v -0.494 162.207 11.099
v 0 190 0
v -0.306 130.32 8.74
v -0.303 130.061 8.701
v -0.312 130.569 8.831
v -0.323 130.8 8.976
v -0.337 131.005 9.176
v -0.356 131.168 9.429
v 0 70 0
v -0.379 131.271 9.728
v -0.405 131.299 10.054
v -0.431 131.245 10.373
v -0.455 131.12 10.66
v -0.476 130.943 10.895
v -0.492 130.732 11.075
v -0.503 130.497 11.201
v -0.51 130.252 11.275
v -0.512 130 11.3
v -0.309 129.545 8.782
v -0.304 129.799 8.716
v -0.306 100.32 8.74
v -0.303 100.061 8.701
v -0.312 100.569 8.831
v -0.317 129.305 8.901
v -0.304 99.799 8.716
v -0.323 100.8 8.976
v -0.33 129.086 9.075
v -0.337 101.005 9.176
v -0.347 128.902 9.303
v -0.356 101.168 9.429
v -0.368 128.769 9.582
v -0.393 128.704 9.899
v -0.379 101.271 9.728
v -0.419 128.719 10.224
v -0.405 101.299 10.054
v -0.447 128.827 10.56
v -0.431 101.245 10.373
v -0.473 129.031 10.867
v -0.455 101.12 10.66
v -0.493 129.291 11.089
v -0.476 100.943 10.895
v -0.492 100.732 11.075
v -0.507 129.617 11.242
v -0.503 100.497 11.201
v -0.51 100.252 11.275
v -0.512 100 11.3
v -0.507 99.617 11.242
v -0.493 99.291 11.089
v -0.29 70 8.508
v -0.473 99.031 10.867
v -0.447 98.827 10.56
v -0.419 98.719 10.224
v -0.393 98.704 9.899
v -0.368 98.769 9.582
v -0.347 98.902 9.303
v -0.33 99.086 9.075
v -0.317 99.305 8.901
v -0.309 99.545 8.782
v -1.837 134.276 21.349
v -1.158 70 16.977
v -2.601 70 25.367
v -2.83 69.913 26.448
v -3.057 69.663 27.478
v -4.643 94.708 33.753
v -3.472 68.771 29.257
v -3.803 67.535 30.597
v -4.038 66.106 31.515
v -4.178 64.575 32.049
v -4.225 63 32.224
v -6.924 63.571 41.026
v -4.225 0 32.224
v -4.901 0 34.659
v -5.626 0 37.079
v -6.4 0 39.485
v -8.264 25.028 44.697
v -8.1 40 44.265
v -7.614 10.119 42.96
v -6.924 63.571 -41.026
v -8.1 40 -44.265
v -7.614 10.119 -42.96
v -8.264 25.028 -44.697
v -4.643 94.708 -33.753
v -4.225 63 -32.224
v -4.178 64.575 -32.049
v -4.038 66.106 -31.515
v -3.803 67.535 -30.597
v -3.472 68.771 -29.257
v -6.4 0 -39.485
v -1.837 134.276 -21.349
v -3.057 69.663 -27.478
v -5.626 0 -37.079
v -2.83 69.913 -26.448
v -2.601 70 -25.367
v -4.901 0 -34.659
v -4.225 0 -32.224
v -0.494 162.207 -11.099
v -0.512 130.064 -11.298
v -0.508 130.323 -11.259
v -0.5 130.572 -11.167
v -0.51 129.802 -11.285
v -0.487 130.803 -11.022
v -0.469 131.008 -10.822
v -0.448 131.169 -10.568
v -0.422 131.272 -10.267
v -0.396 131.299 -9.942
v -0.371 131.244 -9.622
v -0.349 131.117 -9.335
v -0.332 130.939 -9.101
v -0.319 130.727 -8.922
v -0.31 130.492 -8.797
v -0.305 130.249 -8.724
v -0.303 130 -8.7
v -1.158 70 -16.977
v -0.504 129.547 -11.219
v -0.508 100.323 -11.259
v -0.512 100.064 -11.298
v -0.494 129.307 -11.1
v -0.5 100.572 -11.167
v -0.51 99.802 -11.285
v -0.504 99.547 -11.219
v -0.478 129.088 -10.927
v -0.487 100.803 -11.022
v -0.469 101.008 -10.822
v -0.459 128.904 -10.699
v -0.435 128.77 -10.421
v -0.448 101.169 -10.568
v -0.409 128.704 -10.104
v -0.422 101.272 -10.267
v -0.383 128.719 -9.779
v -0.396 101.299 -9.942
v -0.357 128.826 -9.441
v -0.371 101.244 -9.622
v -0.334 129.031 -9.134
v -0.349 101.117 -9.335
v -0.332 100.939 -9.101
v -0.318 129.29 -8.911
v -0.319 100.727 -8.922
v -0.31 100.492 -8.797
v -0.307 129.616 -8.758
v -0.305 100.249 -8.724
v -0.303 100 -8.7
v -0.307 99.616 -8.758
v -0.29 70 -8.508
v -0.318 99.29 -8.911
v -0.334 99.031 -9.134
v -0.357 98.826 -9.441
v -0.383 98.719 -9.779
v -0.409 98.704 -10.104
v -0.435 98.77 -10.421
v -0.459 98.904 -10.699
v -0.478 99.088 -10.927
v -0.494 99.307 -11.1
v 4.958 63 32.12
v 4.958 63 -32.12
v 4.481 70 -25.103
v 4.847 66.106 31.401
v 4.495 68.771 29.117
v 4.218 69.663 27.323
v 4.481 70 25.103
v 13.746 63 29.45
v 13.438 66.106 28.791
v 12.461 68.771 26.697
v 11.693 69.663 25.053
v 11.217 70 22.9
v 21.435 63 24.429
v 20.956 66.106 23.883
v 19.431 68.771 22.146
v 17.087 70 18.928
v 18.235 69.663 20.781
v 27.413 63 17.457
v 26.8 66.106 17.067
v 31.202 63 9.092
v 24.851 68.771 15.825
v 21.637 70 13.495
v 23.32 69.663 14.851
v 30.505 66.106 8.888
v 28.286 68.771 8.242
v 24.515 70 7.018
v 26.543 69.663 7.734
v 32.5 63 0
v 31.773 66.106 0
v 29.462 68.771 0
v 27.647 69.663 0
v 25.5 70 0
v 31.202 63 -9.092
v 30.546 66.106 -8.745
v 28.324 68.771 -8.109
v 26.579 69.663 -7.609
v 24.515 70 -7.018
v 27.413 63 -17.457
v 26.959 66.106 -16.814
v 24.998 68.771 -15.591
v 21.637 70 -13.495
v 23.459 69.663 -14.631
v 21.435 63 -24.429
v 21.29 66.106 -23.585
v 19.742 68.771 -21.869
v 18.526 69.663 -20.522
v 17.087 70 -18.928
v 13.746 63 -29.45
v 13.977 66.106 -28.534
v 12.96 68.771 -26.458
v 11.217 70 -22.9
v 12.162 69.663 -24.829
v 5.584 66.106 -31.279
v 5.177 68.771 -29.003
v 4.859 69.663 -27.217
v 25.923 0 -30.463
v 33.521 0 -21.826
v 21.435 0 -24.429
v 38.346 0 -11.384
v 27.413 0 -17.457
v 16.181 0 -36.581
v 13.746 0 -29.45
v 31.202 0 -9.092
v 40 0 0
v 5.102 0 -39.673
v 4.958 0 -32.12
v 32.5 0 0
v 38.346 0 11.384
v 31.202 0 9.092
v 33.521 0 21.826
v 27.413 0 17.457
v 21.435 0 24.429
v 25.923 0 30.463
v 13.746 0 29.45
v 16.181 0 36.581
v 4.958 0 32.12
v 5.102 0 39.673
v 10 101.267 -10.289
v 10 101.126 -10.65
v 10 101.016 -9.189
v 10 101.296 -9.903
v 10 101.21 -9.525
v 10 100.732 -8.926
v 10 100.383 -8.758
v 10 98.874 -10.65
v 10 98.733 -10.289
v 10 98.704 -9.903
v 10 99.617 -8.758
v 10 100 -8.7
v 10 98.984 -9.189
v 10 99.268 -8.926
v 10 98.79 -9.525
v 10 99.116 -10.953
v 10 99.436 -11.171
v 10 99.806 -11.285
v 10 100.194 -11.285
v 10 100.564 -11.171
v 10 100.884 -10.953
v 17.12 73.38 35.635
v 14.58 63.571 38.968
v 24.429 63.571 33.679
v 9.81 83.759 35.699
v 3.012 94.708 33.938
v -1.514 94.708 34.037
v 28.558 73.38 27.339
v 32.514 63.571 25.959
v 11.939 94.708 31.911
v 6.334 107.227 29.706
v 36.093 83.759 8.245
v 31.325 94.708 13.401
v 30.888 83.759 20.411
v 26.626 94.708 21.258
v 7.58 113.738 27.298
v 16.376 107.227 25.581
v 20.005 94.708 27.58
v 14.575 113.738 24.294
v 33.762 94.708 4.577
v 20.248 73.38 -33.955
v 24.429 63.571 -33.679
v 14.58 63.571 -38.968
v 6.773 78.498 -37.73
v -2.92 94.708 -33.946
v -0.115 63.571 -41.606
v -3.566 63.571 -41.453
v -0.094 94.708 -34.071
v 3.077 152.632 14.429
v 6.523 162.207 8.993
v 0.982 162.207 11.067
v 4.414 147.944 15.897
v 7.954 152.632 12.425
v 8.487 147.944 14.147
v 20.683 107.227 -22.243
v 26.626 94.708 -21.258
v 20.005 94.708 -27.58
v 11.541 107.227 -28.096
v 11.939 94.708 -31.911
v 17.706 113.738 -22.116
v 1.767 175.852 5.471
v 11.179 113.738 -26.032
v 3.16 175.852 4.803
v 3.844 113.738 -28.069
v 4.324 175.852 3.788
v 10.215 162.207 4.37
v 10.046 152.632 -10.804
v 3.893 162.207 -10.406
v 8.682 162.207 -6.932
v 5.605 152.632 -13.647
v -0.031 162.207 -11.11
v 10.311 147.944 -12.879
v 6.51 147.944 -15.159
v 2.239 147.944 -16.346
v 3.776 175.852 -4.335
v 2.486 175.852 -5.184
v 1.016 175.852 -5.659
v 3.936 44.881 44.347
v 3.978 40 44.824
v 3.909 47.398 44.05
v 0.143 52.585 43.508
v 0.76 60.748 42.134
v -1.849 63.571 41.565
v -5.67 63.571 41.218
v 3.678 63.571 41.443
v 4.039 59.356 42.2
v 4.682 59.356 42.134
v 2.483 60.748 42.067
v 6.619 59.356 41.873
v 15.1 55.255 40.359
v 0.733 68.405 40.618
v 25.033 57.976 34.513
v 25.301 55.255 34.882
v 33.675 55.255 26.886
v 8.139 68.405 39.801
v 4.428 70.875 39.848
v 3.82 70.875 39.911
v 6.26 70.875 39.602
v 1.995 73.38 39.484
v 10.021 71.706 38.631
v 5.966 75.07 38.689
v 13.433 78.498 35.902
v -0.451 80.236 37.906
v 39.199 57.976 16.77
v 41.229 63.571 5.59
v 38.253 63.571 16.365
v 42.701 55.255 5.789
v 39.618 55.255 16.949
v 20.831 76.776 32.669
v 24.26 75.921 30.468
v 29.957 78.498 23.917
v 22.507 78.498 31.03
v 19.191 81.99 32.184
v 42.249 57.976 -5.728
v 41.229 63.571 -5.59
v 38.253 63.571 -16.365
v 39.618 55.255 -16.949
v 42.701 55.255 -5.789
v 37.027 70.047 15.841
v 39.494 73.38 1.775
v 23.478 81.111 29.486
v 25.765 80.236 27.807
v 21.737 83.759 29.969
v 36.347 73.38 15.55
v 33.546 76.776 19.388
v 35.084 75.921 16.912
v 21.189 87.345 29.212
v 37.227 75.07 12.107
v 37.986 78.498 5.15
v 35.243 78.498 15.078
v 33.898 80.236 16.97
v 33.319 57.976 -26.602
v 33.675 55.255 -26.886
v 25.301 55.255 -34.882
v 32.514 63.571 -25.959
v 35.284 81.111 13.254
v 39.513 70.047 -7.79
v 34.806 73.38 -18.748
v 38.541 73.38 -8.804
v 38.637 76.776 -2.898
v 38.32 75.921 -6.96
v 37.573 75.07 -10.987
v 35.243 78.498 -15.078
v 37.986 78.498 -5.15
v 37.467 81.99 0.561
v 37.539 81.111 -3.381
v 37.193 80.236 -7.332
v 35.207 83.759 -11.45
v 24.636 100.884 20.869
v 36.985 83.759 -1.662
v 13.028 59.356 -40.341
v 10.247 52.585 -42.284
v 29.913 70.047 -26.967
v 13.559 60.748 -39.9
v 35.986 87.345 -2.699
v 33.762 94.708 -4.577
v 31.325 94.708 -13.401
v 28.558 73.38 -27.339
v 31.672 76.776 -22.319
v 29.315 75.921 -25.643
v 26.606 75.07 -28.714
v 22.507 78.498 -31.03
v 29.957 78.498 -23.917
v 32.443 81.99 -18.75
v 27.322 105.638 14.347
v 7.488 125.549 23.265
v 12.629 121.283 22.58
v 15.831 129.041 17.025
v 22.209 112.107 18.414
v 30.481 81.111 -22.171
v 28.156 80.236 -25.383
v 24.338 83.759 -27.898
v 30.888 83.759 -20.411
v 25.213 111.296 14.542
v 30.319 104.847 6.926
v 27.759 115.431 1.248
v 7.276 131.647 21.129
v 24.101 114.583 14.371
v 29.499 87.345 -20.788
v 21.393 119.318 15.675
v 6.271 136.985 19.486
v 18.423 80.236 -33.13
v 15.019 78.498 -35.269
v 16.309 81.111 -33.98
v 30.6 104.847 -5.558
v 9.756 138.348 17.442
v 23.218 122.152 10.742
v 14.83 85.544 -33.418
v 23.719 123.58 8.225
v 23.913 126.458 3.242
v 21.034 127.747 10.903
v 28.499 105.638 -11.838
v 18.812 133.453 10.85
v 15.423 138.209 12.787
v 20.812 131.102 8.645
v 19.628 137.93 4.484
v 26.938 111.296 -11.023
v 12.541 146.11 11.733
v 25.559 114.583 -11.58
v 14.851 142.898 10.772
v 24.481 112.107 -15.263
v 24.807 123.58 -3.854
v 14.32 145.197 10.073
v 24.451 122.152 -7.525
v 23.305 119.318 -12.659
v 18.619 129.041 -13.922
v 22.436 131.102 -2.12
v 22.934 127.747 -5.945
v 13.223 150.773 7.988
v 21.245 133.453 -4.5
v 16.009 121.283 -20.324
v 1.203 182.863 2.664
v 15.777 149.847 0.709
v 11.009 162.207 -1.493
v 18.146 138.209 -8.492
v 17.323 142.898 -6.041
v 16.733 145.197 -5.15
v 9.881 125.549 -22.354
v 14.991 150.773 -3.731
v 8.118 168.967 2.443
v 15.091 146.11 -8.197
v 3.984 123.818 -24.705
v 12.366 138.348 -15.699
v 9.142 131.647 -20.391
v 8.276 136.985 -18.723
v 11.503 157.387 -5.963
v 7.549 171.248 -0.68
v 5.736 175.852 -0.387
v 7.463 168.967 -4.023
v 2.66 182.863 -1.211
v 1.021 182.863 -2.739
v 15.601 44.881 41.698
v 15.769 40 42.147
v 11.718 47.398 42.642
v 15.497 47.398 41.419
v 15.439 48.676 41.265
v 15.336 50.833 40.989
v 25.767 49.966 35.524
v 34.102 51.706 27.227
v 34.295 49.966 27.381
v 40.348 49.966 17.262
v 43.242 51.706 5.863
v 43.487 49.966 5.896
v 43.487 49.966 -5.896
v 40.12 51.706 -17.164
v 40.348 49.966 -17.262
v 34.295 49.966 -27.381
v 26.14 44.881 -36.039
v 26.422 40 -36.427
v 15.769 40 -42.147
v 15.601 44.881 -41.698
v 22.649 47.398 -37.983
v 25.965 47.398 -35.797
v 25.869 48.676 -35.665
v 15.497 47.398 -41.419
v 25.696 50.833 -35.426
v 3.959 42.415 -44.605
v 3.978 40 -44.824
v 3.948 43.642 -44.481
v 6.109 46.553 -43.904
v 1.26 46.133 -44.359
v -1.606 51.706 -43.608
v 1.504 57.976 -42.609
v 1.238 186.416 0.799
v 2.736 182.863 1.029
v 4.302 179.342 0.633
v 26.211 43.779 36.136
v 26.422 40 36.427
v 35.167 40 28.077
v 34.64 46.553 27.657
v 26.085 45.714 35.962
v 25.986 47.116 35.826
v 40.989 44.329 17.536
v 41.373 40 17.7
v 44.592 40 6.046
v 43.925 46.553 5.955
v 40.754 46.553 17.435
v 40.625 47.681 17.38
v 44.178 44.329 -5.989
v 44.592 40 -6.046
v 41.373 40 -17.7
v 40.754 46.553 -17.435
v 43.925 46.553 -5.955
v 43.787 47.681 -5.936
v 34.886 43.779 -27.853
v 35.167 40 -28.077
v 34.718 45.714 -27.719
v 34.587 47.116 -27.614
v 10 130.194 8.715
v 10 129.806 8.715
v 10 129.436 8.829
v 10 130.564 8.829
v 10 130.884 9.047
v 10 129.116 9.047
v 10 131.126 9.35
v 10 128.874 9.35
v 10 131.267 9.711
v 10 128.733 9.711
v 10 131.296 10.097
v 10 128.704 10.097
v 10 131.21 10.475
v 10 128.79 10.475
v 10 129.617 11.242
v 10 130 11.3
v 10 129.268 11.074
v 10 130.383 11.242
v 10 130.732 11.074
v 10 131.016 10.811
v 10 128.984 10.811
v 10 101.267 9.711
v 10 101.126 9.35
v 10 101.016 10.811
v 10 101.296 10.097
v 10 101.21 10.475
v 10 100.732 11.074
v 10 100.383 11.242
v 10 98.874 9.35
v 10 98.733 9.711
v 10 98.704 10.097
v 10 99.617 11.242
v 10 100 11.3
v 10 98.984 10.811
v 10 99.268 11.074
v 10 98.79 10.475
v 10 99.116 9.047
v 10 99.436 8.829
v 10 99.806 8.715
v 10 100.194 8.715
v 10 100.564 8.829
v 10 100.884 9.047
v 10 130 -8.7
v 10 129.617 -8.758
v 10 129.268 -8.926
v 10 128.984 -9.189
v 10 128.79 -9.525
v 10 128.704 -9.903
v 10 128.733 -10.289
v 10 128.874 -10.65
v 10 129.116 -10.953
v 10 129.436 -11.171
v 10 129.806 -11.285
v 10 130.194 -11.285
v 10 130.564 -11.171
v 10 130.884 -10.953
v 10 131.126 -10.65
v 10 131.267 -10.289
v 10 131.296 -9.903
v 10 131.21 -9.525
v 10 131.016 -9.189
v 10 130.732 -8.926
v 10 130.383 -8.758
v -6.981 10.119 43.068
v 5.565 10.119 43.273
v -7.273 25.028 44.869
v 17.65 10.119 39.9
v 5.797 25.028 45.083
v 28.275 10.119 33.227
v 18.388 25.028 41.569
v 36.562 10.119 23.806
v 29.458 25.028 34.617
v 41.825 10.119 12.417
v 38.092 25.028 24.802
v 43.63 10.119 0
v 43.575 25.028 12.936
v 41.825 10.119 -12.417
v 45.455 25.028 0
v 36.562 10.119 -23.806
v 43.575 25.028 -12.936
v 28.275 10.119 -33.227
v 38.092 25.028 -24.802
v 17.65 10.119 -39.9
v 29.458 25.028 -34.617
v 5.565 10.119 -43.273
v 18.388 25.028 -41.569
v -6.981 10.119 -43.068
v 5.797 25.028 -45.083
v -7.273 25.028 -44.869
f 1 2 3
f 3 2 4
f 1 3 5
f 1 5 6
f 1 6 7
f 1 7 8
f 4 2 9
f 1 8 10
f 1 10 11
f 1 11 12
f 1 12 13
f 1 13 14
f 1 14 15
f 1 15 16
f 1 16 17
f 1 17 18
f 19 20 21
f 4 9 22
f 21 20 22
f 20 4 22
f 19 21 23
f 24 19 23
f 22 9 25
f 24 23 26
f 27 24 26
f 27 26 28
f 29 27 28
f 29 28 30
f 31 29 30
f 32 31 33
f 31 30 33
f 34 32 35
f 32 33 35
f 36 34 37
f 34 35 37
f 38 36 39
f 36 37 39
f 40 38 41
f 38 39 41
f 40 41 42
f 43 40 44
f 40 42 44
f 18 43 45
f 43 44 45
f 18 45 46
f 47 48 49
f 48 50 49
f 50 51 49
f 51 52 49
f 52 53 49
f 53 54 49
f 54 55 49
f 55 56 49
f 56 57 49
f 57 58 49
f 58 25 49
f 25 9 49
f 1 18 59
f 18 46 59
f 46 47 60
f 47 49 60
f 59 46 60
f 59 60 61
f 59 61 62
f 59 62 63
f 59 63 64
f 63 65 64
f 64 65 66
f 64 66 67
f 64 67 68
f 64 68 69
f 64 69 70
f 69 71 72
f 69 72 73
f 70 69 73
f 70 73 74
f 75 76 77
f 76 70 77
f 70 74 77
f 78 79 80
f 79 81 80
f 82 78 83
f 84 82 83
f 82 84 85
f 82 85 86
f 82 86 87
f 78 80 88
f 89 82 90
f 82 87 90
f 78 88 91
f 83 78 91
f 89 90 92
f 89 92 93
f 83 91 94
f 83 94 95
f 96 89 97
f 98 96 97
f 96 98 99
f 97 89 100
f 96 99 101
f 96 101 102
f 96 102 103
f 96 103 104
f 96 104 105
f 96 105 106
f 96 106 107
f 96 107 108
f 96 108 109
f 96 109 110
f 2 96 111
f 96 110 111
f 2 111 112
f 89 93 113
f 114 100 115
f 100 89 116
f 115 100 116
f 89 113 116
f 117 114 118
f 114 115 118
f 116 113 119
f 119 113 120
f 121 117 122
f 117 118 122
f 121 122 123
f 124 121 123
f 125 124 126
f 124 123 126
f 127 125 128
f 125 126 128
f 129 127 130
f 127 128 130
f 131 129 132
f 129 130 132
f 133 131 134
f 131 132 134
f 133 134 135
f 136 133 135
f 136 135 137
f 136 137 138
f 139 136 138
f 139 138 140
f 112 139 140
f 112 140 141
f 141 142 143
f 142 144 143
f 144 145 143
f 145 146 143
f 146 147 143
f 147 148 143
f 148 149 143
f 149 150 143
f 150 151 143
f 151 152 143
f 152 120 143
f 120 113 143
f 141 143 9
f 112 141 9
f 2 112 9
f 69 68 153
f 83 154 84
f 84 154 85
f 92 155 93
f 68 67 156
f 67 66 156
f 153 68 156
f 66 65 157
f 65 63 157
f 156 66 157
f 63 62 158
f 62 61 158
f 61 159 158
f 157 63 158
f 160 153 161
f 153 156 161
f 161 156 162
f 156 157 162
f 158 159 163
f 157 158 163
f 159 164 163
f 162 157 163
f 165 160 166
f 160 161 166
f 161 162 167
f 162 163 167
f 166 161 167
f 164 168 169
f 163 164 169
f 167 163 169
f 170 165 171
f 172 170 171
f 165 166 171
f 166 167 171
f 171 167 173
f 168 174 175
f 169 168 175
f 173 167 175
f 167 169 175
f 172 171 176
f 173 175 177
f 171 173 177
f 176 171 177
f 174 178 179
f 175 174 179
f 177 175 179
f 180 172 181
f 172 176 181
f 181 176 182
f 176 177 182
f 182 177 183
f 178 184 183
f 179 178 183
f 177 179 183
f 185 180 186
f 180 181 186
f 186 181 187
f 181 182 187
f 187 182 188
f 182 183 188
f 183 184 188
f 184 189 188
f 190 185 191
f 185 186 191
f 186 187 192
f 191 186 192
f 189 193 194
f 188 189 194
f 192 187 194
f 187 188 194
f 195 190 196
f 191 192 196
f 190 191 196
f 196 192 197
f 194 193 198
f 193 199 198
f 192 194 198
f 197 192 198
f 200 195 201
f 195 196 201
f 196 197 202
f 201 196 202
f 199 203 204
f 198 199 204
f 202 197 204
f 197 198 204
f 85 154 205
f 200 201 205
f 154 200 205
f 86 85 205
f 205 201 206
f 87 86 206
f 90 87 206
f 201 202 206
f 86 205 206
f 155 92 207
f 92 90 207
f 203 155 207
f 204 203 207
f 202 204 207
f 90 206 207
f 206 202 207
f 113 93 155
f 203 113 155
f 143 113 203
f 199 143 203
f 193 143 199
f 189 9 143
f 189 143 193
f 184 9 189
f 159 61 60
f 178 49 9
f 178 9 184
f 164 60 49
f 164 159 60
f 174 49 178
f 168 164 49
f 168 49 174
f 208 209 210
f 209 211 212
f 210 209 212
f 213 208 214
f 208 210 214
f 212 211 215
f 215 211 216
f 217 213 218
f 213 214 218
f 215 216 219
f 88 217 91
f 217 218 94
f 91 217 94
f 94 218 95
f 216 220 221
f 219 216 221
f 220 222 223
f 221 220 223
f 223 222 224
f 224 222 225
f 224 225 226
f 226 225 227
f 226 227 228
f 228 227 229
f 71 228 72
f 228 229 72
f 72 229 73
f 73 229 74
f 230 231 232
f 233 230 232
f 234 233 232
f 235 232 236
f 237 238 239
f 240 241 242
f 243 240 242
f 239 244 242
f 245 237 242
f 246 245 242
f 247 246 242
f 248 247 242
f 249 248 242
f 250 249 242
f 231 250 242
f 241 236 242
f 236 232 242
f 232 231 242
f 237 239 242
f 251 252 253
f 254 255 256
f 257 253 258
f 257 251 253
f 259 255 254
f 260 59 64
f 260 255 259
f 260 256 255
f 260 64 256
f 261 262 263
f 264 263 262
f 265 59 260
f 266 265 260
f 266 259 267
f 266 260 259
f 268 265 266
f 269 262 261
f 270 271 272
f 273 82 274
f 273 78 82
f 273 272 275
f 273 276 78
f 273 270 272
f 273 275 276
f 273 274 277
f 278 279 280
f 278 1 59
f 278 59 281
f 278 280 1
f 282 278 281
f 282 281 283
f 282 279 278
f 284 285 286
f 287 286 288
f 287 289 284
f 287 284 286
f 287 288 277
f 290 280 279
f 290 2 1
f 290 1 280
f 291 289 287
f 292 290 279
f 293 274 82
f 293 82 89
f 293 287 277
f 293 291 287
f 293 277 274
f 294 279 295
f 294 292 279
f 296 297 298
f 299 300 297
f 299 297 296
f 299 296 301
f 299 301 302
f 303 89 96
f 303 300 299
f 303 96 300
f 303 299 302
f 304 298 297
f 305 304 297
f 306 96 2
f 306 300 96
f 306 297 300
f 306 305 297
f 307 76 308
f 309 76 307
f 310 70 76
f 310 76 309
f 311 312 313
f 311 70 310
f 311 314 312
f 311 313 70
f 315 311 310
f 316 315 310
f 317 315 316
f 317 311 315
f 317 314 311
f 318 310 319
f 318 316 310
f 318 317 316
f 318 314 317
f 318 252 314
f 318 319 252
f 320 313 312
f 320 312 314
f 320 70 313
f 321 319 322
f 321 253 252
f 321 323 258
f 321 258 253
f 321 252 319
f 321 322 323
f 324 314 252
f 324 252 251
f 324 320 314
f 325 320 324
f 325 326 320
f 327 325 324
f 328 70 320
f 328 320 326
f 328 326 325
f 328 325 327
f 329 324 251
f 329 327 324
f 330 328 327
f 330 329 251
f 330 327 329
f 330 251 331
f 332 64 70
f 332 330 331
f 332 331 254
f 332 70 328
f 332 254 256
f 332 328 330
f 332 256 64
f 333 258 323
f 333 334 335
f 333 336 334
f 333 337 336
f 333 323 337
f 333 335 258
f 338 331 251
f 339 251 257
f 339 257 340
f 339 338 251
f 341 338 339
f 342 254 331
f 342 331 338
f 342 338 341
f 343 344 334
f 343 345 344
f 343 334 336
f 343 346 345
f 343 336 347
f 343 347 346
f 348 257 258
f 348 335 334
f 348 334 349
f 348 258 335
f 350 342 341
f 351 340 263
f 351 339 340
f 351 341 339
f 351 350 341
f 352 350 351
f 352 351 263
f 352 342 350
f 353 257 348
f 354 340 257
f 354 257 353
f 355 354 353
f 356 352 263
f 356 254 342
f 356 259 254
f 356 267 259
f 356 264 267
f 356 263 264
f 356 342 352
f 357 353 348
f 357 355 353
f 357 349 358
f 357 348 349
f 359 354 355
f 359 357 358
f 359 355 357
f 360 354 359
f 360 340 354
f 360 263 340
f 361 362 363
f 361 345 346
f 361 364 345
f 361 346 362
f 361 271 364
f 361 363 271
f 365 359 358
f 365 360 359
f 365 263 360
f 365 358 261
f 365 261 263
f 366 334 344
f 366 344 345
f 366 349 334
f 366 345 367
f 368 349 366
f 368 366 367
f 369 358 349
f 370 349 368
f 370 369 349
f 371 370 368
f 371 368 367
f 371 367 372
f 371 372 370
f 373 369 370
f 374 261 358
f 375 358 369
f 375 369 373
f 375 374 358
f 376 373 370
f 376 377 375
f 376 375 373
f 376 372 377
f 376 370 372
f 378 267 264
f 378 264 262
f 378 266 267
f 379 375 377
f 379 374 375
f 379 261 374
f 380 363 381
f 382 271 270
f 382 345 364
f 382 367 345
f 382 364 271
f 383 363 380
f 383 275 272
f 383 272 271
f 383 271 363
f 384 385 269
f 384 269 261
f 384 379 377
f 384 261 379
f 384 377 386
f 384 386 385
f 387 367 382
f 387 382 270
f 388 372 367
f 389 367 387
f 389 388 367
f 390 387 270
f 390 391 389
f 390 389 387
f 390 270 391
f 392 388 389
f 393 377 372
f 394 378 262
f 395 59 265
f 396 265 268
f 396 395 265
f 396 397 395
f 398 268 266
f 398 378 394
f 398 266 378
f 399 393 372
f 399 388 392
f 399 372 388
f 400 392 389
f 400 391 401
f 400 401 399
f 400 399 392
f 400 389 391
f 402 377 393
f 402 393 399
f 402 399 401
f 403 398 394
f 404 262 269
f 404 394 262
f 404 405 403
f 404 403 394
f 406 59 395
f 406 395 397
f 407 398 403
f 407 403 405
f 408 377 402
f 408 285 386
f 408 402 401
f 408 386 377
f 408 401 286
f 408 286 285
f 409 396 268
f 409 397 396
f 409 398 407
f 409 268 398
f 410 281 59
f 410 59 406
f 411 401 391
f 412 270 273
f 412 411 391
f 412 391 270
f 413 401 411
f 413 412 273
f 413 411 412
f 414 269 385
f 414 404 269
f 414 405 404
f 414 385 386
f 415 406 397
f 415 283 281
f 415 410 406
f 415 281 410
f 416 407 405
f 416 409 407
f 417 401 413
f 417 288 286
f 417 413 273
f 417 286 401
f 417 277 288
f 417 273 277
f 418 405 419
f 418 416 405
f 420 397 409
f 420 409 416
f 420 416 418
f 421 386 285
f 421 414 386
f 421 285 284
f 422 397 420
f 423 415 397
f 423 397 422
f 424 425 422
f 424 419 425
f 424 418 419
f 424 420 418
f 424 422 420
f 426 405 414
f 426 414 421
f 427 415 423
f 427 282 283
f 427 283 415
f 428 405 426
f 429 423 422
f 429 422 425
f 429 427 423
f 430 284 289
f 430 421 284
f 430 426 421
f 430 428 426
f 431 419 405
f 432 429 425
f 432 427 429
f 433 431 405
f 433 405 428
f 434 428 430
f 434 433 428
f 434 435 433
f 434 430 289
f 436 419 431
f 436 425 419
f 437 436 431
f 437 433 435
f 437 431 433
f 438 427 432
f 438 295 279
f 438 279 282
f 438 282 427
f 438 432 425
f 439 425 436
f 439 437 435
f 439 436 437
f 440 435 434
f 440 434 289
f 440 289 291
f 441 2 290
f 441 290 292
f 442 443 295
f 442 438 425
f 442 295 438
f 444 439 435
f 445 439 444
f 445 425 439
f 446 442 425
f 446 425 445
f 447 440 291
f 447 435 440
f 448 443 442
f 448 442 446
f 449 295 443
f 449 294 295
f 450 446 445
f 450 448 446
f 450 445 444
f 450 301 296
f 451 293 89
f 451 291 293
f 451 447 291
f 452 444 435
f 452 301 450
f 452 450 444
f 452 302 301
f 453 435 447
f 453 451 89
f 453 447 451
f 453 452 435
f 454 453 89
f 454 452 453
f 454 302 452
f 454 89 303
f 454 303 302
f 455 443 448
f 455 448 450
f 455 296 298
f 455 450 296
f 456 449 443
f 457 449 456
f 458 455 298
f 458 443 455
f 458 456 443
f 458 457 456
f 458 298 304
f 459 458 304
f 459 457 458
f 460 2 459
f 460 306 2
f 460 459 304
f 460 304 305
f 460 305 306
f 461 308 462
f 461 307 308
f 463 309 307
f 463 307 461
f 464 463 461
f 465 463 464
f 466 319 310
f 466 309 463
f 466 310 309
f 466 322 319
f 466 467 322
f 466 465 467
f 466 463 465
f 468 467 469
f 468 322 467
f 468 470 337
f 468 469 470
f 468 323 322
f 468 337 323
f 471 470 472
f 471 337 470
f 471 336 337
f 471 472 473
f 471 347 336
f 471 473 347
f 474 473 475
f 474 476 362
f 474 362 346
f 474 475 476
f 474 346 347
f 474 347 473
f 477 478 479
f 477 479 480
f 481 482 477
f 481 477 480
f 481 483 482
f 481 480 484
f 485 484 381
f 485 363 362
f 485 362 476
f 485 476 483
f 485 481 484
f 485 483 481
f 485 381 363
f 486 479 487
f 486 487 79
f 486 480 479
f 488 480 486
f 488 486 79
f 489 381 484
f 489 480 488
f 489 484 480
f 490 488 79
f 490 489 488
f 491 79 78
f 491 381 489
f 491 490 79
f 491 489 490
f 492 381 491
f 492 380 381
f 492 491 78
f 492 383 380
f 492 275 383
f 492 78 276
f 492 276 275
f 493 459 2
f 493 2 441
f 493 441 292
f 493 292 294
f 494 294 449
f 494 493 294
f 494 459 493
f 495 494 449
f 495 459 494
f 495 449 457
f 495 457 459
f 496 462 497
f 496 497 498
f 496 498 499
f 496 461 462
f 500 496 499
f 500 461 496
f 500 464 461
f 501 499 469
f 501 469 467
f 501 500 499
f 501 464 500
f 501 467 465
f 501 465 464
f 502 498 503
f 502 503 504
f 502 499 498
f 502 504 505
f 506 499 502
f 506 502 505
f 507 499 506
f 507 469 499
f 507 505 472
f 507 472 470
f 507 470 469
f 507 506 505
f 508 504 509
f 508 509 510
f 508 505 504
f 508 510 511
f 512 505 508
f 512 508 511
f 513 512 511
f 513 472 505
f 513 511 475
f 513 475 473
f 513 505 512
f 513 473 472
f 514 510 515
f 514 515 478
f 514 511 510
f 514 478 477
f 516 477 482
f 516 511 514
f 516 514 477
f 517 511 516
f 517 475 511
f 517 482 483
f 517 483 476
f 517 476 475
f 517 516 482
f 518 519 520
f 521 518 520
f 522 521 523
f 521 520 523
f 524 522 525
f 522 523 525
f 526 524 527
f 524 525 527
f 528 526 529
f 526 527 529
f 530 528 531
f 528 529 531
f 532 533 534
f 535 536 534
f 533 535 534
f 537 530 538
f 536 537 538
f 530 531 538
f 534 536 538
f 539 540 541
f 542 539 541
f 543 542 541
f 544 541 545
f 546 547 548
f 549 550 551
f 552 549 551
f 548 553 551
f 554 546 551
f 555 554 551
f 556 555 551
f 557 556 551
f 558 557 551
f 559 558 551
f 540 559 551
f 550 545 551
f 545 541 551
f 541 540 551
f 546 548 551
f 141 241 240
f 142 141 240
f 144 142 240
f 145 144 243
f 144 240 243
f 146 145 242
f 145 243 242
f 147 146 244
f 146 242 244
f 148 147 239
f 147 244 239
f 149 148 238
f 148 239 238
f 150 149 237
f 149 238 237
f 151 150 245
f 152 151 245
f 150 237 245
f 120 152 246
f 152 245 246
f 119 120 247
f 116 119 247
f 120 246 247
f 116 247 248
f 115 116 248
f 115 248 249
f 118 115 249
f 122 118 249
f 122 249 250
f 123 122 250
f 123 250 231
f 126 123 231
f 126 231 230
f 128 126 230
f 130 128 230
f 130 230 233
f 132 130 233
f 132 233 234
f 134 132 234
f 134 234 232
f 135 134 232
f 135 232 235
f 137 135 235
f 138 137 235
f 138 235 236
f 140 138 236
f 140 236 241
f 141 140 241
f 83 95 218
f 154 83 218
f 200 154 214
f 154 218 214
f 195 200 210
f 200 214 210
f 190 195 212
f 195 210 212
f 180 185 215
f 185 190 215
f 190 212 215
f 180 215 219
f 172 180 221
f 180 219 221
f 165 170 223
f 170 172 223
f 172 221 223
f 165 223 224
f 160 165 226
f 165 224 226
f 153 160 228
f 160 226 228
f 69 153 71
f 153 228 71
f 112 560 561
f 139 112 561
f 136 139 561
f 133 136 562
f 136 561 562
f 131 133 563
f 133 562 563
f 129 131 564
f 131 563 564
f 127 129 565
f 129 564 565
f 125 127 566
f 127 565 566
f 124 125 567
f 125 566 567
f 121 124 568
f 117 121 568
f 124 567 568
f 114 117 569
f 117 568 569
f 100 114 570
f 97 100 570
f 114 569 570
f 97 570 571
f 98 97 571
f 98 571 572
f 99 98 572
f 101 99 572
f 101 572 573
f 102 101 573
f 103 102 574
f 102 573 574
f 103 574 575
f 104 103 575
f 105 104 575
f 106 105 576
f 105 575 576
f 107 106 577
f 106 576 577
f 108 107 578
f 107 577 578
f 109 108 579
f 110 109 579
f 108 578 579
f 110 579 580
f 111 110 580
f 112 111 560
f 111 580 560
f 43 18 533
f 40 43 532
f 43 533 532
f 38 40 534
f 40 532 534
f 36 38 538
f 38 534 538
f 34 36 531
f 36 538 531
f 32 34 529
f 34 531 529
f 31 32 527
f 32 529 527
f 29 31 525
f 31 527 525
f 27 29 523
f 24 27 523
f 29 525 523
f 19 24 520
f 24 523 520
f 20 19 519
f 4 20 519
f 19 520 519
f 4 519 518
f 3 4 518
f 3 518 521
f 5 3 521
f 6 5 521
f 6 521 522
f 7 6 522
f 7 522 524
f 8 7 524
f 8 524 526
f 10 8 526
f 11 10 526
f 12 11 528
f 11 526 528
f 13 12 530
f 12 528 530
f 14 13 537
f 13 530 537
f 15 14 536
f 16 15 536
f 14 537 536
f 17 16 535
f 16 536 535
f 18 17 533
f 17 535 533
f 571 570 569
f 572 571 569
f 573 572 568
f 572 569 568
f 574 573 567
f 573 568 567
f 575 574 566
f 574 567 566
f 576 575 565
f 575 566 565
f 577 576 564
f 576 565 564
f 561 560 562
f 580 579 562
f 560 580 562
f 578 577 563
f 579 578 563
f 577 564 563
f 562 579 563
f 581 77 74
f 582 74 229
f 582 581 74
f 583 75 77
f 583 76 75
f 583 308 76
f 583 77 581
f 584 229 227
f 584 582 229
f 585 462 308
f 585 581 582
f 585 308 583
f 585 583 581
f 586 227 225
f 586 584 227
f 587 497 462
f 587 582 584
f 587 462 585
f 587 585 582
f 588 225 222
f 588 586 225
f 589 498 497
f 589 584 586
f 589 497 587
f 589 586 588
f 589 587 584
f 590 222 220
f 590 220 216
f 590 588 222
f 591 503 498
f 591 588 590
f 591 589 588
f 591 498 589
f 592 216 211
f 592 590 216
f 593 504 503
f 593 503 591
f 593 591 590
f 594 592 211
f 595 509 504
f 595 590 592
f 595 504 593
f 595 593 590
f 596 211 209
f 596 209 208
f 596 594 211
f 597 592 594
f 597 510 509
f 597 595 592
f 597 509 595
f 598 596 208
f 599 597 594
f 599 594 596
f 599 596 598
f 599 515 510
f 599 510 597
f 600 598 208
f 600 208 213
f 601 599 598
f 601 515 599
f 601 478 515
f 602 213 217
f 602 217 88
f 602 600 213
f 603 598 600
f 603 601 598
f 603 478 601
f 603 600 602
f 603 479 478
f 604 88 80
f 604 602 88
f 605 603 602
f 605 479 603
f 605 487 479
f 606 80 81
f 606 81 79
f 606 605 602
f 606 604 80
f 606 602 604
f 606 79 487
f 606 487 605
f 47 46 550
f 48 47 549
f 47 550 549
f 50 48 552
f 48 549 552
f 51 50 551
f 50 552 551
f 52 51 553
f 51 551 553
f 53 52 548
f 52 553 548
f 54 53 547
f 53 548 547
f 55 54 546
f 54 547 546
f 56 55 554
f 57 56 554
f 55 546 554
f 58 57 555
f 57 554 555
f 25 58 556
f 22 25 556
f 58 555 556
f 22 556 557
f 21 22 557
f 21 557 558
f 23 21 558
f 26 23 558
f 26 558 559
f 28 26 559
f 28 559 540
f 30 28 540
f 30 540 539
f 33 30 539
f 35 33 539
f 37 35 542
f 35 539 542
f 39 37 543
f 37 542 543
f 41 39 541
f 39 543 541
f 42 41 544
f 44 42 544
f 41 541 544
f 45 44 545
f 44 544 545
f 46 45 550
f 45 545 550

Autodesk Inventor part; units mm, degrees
ref_plane "YZ Plane" through (0, 0, 0) normal (1, 0, 0) x (0, 1, 0)
ref_plane "XZ Plane" through (0, 0, 0) normal (0, 1, 0) x (-1, 0, 0)
ref_plane "XY Plane" through (0, 0, 0) normal (0, 0, 1) x (1, 0, 0)
sketch "スケッチ1" plane through (0, 0, 0) normal (0, 0, 1) x (1, 0, 0)
  line L0 (0, 0) -> (0, 40)
  line L1 (0, 40) -> (0, 190)
  line L2 (0, 40) -> (-45, 40)
  line L3 (0, 0) -> (-40, 0)
  spline S0 degree 2 poles (-40, 0) (-61.343, 41.3687) (0, 190) knots 0 0 0 1 1 1
  point P0 (0, 100)
  dimension "d0" = 40
  dimension "d1" = 150
  dimension "d2" = 45
  dimension "d3" = 40
  dimension "d14" = 100
revolve "回転1" add sketch "スケッチ1" angle 360 about axis through (0, 40, 0) along (0, 1, 0)
sketch "スケッチ4" plane through (0, 0, 0) normal (0, -1, 0) x (1, 0, 0)
  circle A0 centre (0, 0) radius 40 projected
  line L0 (-30, -26.4575) -> (-30, 26.4575)
  circle A1 centre (0, 0) radius 50.9747
  line L1 (-30, -41.2119) -> (-30, 41.2119)
  point P0 (-30, 0)
  point P1 (-40, 0)
  dimension "d15" = 30
extrude "押し出し3" cut sketch "スケッチ4" against normal blind 400 contours L0 A0 | A0 L1 A1 picked at (-33.2623, -1.3742) picked at (-32.3949, 34.1789)
sketch "スケッチ5" plane through (-30, 0, -26.4575) normal (-1, 0, 0) x (0, 0, 1)
  line L0 (52.915, 0) -> (0, 0) projected
  point P0 (26.4575, 0)
  point P1 (26.4575, 0)
  point P2 (16.4575, 100)
  point P3 (16.4575, 130)
  point P4 (36.4575, 100)
  point P5 (36.4575, 130)
  dimension "d20" = 30
hole "穴1" at (-30, 100, -10) at (-30, 130, -10) at (-30, 130, 10) at (-30, 100, 10) direction (1, 0, 0) diameter 2.6 depth 40
sketch "スケッチ6" plane through (0, 0, 0) normal (0, -1, 0) x (1, 0, 0)
  circle A0 centre (-125, 0) radius 125
  point P0 (0, 0)
  dimension "d28" = 250
  dimension "d29" = 125
extrude "押し出し4" cut sketch "スケッチ6" against normal blind 400
sketch "スケッチ7" plane through (0, 0, 0) normal (0, -1, 0) x (1, 0, 0)
  circle A0 centre (0, 0) radius 32.5
  dimension "d32" = 65
extrude "押し出し5" cut sketch "スケッチ7" against normal blind 70
fillet "フィレット2" radius 7 1 edges at (32.5, 70, 0)
properties part number "newleg" material "ゴム、黒"
